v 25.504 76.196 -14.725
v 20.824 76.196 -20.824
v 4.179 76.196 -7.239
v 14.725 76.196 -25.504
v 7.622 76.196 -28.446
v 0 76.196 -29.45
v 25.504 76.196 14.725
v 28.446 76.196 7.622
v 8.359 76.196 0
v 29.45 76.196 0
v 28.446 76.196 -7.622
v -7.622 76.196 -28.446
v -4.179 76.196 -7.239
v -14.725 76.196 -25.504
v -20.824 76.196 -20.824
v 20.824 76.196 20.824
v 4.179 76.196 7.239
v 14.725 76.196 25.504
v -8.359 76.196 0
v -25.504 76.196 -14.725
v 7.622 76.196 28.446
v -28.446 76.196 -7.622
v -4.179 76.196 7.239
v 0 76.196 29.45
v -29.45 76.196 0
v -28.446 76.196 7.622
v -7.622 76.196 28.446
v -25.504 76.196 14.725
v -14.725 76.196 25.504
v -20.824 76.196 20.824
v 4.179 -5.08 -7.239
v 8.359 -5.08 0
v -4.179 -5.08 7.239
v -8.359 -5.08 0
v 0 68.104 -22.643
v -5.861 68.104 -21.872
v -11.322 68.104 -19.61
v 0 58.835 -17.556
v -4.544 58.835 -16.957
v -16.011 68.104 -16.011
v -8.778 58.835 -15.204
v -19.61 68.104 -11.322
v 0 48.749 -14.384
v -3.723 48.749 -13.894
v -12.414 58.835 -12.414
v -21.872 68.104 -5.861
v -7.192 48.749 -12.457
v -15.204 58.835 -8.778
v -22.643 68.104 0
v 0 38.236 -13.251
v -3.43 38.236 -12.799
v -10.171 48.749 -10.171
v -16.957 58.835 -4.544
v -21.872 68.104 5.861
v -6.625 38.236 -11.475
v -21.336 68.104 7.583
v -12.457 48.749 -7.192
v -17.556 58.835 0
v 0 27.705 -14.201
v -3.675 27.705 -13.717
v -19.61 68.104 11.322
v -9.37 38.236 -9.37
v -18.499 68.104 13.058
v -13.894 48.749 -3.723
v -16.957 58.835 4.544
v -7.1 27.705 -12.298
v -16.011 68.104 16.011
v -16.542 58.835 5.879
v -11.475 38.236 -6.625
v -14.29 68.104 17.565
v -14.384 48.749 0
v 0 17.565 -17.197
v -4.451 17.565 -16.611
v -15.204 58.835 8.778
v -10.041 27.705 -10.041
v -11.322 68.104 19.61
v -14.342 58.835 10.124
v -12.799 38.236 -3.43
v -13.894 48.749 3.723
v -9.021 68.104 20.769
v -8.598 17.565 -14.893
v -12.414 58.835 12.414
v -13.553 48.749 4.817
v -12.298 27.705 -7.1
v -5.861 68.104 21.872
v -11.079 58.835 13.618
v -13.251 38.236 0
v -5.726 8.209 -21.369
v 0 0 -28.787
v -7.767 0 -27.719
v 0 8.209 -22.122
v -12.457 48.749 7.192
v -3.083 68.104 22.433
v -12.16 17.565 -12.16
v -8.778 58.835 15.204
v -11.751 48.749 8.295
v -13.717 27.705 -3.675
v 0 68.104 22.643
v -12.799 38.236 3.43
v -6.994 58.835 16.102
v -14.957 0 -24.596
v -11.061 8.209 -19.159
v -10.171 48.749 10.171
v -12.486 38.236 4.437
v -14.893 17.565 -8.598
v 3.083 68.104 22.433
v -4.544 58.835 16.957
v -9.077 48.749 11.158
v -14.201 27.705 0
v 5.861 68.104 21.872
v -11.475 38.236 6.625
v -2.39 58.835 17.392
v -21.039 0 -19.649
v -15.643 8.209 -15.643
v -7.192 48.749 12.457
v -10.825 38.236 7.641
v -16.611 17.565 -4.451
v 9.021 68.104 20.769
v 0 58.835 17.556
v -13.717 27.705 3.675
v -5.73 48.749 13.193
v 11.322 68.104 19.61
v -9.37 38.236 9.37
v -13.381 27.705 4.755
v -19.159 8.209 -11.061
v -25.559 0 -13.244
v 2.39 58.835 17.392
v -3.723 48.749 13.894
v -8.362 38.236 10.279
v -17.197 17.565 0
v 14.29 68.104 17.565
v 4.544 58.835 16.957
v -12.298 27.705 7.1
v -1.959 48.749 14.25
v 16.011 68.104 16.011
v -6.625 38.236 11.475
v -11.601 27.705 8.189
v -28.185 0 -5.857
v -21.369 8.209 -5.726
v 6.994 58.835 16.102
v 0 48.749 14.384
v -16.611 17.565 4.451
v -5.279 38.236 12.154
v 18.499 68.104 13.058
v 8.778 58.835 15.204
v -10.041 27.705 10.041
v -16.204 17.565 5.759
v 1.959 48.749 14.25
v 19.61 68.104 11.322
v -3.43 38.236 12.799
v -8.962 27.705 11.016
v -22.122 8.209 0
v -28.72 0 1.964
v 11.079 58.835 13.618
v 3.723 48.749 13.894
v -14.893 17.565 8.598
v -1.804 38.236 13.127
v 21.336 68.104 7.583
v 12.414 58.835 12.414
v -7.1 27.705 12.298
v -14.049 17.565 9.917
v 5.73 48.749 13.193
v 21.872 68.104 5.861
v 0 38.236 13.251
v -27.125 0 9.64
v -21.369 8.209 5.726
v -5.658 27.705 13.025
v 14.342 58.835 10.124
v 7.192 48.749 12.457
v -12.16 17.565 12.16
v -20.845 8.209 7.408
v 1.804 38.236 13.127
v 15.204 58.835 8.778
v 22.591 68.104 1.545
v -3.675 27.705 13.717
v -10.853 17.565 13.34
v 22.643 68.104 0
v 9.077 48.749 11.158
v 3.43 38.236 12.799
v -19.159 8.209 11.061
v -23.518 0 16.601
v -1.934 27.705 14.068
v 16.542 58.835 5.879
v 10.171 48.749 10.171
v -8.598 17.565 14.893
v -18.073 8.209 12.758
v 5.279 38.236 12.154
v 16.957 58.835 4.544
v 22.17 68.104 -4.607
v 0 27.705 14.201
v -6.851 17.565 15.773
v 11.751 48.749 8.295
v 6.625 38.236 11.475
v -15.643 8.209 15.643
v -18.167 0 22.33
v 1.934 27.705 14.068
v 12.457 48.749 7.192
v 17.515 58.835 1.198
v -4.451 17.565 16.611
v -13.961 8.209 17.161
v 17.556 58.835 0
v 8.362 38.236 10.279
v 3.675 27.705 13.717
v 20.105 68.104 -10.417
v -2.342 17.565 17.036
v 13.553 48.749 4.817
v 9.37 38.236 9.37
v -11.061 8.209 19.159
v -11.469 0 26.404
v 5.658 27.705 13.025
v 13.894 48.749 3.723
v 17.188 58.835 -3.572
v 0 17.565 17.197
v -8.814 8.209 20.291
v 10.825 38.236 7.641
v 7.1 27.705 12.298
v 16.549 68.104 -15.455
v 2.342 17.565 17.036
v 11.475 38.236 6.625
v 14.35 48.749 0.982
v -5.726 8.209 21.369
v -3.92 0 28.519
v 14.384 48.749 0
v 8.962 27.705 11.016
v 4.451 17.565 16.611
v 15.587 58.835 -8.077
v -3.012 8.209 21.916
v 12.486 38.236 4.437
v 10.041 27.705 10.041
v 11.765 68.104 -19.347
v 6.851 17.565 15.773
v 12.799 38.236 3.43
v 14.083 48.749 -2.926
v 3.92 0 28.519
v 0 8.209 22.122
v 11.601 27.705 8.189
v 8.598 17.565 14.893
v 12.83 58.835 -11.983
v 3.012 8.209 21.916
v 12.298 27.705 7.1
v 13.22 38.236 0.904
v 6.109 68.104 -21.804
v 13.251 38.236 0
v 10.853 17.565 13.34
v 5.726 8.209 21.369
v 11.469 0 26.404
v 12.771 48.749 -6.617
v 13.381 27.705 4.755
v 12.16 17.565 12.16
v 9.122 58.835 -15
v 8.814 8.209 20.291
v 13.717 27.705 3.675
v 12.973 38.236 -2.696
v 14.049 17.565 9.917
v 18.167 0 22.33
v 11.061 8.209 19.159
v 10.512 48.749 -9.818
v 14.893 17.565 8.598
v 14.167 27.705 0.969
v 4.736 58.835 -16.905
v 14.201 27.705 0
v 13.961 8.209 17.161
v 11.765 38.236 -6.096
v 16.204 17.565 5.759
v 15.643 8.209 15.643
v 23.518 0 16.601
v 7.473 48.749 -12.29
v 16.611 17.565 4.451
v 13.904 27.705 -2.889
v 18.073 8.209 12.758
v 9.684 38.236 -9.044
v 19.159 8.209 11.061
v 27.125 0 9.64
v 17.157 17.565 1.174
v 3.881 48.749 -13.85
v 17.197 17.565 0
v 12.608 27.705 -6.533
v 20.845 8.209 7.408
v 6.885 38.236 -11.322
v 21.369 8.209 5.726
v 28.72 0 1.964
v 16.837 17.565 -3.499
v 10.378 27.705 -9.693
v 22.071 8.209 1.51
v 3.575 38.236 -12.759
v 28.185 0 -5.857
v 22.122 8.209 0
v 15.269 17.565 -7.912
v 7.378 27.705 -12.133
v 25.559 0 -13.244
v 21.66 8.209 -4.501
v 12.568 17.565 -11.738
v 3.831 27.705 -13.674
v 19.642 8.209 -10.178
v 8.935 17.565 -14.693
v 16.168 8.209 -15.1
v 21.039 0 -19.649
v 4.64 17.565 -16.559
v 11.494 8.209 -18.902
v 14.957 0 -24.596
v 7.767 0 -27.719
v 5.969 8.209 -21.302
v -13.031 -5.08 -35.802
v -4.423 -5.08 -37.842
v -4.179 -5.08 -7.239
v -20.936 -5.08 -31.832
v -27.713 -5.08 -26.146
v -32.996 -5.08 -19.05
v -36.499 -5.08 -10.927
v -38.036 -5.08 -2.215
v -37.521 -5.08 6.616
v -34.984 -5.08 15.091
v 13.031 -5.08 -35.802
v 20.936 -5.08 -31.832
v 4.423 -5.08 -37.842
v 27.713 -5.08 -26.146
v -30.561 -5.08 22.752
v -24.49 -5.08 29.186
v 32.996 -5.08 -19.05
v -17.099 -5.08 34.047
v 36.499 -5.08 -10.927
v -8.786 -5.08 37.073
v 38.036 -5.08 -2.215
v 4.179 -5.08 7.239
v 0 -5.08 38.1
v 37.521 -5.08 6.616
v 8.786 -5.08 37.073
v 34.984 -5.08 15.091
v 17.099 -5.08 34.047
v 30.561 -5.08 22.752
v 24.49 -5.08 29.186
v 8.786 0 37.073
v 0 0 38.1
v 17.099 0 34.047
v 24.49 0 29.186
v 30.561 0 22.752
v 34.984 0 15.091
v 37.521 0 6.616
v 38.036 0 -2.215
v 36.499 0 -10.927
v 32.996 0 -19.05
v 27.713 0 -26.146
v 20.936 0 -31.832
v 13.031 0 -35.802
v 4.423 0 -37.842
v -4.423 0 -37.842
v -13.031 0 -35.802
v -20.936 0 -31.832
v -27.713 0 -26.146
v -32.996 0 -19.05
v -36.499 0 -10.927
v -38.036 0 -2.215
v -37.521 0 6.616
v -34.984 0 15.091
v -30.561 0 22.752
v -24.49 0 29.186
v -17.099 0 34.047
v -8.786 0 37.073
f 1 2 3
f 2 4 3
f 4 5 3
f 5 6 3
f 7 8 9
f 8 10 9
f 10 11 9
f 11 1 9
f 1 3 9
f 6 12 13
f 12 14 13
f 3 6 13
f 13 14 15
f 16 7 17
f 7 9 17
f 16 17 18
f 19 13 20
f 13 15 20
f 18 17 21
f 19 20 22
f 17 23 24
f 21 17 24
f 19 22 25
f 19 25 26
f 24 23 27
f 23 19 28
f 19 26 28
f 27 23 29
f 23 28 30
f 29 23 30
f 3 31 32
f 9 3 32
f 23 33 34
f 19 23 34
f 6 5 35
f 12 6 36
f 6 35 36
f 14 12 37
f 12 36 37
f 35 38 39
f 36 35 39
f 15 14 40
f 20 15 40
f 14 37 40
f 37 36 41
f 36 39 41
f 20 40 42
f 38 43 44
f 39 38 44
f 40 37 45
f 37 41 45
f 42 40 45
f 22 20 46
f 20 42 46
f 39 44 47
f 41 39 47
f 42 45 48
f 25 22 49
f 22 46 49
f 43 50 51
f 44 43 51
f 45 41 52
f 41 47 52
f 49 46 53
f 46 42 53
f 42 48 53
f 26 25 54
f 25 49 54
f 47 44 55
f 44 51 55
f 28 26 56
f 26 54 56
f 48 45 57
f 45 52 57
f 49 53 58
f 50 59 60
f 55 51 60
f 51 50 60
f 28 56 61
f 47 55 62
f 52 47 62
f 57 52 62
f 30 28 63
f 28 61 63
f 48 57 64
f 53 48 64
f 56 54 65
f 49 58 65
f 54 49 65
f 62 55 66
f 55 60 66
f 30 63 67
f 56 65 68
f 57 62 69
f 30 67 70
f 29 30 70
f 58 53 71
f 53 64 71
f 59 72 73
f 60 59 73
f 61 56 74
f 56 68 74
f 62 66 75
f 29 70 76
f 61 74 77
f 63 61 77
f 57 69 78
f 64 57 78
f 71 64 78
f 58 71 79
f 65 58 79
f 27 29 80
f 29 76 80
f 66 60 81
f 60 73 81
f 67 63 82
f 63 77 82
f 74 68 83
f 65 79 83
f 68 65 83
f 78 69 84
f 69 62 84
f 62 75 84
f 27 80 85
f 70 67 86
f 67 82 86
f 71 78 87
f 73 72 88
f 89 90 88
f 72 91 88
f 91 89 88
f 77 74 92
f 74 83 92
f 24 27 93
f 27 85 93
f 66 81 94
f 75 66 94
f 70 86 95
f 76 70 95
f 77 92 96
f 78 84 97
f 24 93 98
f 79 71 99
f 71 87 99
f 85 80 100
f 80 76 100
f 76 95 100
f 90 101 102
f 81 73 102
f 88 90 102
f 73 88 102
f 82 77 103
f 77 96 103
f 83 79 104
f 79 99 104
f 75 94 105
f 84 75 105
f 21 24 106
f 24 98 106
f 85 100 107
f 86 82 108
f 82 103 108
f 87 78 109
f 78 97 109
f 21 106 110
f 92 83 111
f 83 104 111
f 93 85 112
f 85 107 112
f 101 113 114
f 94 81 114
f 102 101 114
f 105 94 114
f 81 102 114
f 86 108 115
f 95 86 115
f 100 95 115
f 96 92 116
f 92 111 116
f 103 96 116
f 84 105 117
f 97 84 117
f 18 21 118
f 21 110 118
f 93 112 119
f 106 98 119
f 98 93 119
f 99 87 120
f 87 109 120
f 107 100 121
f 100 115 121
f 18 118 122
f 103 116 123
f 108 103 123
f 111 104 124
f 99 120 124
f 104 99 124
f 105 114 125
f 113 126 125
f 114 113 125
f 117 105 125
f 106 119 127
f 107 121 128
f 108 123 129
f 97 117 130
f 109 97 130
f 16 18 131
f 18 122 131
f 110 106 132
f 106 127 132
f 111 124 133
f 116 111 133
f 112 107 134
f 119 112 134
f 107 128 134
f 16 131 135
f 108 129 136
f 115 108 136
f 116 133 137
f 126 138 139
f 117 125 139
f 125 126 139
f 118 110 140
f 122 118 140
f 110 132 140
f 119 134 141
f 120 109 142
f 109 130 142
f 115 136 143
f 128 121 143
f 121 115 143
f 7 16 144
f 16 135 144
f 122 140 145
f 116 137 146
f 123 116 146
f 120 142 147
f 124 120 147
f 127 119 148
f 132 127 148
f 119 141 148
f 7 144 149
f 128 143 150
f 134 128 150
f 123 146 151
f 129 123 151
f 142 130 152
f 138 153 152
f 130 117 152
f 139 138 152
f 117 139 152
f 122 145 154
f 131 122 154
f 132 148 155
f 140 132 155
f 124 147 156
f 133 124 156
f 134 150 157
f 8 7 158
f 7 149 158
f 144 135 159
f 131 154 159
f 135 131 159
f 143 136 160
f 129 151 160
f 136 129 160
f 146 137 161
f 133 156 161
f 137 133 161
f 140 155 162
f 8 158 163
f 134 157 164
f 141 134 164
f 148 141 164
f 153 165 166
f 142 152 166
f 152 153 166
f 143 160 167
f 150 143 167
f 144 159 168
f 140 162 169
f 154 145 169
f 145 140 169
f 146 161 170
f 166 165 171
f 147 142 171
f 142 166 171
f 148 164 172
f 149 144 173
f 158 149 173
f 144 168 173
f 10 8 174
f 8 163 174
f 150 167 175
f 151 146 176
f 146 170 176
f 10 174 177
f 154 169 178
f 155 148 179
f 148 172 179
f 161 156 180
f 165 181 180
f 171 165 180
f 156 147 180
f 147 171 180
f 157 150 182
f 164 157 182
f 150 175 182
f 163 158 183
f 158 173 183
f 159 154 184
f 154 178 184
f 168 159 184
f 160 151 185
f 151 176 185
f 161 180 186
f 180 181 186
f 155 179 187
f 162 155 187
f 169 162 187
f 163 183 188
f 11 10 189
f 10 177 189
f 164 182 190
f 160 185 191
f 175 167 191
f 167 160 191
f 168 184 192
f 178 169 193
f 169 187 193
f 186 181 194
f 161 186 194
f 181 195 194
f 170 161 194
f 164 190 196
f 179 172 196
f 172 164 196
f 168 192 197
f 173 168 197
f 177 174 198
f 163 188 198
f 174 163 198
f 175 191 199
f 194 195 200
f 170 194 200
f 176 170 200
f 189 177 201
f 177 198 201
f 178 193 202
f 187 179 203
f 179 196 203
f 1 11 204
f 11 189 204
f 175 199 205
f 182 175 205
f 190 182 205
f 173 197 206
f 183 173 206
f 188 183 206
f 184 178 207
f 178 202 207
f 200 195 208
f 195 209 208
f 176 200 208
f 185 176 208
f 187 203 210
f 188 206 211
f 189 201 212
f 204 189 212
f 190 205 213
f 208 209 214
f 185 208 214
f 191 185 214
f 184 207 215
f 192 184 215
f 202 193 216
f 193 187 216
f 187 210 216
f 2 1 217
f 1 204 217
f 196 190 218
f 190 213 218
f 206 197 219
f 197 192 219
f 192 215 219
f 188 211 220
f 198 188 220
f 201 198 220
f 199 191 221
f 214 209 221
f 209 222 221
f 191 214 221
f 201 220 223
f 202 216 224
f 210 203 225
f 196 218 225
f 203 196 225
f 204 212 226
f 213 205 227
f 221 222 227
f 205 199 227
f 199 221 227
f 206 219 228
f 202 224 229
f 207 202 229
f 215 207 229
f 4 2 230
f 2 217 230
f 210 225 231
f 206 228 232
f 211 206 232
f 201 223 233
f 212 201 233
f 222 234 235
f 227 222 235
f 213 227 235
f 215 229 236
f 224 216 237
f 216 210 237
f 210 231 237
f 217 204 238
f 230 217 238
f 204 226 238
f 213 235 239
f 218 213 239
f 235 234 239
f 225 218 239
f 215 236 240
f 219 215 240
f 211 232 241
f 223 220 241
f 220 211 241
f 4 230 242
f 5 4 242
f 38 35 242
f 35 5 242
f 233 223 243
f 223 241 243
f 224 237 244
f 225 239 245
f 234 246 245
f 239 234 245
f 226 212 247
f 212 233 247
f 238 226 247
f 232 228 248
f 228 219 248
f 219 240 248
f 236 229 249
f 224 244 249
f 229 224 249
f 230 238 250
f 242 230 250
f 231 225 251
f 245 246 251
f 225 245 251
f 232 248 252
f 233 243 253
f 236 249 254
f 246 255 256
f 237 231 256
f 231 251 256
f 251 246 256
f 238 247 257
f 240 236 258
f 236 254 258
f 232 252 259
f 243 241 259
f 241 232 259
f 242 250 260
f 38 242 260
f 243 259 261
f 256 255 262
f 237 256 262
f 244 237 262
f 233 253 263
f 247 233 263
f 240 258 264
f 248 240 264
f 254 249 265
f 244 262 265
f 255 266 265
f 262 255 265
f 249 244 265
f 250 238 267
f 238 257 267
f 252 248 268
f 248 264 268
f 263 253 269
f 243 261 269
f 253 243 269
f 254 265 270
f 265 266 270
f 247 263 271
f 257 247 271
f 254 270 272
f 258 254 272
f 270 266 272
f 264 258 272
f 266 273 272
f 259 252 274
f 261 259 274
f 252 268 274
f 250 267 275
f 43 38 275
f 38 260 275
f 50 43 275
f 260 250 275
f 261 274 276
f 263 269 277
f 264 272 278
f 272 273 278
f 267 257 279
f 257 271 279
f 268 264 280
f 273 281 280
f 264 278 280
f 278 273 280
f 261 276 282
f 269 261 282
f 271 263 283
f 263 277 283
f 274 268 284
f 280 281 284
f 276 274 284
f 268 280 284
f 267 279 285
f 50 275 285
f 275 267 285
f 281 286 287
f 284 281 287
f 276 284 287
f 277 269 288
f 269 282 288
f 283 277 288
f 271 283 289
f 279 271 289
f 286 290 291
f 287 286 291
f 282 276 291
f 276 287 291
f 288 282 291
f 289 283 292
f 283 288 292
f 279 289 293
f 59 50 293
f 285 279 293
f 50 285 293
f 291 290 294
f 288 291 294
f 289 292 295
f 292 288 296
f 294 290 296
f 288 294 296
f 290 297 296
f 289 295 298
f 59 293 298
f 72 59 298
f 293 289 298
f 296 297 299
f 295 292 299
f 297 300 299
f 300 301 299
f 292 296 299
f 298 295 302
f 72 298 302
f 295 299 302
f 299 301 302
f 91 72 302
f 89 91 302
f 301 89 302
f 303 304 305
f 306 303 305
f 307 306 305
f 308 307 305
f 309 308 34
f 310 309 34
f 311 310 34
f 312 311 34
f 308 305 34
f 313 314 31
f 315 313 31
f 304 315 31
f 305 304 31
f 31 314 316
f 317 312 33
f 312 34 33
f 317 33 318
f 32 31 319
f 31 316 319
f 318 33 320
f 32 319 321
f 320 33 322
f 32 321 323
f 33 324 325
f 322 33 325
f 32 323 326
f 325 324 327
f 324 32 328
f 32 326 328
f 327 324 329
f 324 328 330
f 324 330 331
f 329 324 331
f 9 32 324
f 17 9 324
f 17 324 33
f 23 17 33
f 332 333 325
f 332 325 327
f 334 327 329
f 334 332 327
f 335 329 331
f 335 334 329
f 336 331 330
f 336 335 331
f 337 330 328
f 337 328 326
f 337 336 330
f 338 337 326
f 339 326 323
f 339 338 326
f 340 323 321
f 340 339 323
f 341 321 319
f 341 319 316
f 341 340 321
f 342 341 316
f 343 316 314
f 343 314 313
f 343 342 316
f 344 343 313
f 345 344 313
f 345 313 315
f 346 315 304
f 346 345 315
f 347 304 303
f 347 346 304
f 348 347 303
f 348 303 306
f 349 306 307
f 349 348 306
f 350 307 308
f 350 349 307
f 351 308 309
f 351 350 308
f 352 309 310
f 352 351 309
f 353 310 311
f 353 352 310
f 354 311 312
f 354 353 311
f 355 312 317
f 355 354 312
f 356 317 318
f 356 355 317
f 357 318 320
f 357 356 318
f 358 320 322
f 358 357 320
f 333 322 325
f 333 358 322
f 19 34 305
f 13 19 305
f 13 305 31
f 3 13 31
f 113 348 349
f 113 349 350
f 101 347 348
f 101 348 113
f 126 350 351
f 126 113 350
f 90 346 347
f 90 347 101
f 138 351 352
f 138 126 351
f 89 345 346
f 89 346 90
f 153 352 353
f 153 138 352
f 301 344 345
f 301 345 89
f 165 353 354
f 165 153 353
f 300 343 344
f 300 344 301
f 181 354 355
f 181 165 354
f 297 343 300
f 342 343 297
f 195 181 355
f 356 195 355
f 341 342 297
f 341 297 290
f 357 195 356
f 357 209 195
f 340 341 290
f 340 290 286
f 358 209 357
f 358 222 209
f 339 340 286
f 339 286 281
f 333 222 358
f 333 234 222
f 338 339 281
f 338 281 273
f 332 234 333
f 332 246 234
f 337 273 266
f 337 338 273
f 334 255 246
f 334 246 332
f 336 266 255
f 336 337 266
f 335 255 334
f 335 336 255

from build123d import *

# Parameters (mm, degrees)
SKETCH1_R           = 38.1
BOSS_EXTRUDE1_DEPTH = 5.08
CUT_EXTRUDE1_DEPTH  = 98.514006601


with BuildPart() as part:
    # Sketch1 → Boss-Extrude1 (new body)
    with BuildSketch(Plane(origin=(0, 0, 0), x_dir=(1, 0, 0), z_dir=(0, 1, 0))):
        with Locations(Location((0, 0, 0), (0, 0, 270))):
            Circle(SKETCH1_R)
    extrude(amount=-BOSS_EXTRUDE1_DEPTH)

    # Sketch4 → Revolve1 (revolve)
    with BuildSketch(Plane.XY, mode=Mode.PRIVATE) as revolve1_sk:
        with BuildLine():
            Line((0, 0), (0, 76.19583579))
            Line((0, 76.19583579), (29.449785718, 76.19583579))
            ThreePointArc((29.449785718, 76.19583579), (13.250608801, 38.235955518), (28.786938765, 0))
            Line((28.786938765, 0), (0, 0))
        make_face()
    revolve(revolve1_sk.sketch.rotate(Axis((0, 0, 0), (0, 1, 0)), 90), axis=Axis((0, 0, 0), (0, 1, 0)))

    # Sketch5 → Cut-Extrude1 (cut, through all)
    with BuildSketch(Plane(origin=(0, -5.08, 0), x_dir=(-1, 0, 0), z_dir=(0, -1, 0))):
        Polygon((8.358877197, 0), (4.179438599, 7.239), (-4.179438599, 7.239), (-8.358877197, 0), (-4.179438599, -7.239), (4.179438599, -7.239), align=None)
    extrude(amount=-CUT_EXTRUDE1_DEPTH, mode=Mode.SUBTRACT)


solid = part.part
